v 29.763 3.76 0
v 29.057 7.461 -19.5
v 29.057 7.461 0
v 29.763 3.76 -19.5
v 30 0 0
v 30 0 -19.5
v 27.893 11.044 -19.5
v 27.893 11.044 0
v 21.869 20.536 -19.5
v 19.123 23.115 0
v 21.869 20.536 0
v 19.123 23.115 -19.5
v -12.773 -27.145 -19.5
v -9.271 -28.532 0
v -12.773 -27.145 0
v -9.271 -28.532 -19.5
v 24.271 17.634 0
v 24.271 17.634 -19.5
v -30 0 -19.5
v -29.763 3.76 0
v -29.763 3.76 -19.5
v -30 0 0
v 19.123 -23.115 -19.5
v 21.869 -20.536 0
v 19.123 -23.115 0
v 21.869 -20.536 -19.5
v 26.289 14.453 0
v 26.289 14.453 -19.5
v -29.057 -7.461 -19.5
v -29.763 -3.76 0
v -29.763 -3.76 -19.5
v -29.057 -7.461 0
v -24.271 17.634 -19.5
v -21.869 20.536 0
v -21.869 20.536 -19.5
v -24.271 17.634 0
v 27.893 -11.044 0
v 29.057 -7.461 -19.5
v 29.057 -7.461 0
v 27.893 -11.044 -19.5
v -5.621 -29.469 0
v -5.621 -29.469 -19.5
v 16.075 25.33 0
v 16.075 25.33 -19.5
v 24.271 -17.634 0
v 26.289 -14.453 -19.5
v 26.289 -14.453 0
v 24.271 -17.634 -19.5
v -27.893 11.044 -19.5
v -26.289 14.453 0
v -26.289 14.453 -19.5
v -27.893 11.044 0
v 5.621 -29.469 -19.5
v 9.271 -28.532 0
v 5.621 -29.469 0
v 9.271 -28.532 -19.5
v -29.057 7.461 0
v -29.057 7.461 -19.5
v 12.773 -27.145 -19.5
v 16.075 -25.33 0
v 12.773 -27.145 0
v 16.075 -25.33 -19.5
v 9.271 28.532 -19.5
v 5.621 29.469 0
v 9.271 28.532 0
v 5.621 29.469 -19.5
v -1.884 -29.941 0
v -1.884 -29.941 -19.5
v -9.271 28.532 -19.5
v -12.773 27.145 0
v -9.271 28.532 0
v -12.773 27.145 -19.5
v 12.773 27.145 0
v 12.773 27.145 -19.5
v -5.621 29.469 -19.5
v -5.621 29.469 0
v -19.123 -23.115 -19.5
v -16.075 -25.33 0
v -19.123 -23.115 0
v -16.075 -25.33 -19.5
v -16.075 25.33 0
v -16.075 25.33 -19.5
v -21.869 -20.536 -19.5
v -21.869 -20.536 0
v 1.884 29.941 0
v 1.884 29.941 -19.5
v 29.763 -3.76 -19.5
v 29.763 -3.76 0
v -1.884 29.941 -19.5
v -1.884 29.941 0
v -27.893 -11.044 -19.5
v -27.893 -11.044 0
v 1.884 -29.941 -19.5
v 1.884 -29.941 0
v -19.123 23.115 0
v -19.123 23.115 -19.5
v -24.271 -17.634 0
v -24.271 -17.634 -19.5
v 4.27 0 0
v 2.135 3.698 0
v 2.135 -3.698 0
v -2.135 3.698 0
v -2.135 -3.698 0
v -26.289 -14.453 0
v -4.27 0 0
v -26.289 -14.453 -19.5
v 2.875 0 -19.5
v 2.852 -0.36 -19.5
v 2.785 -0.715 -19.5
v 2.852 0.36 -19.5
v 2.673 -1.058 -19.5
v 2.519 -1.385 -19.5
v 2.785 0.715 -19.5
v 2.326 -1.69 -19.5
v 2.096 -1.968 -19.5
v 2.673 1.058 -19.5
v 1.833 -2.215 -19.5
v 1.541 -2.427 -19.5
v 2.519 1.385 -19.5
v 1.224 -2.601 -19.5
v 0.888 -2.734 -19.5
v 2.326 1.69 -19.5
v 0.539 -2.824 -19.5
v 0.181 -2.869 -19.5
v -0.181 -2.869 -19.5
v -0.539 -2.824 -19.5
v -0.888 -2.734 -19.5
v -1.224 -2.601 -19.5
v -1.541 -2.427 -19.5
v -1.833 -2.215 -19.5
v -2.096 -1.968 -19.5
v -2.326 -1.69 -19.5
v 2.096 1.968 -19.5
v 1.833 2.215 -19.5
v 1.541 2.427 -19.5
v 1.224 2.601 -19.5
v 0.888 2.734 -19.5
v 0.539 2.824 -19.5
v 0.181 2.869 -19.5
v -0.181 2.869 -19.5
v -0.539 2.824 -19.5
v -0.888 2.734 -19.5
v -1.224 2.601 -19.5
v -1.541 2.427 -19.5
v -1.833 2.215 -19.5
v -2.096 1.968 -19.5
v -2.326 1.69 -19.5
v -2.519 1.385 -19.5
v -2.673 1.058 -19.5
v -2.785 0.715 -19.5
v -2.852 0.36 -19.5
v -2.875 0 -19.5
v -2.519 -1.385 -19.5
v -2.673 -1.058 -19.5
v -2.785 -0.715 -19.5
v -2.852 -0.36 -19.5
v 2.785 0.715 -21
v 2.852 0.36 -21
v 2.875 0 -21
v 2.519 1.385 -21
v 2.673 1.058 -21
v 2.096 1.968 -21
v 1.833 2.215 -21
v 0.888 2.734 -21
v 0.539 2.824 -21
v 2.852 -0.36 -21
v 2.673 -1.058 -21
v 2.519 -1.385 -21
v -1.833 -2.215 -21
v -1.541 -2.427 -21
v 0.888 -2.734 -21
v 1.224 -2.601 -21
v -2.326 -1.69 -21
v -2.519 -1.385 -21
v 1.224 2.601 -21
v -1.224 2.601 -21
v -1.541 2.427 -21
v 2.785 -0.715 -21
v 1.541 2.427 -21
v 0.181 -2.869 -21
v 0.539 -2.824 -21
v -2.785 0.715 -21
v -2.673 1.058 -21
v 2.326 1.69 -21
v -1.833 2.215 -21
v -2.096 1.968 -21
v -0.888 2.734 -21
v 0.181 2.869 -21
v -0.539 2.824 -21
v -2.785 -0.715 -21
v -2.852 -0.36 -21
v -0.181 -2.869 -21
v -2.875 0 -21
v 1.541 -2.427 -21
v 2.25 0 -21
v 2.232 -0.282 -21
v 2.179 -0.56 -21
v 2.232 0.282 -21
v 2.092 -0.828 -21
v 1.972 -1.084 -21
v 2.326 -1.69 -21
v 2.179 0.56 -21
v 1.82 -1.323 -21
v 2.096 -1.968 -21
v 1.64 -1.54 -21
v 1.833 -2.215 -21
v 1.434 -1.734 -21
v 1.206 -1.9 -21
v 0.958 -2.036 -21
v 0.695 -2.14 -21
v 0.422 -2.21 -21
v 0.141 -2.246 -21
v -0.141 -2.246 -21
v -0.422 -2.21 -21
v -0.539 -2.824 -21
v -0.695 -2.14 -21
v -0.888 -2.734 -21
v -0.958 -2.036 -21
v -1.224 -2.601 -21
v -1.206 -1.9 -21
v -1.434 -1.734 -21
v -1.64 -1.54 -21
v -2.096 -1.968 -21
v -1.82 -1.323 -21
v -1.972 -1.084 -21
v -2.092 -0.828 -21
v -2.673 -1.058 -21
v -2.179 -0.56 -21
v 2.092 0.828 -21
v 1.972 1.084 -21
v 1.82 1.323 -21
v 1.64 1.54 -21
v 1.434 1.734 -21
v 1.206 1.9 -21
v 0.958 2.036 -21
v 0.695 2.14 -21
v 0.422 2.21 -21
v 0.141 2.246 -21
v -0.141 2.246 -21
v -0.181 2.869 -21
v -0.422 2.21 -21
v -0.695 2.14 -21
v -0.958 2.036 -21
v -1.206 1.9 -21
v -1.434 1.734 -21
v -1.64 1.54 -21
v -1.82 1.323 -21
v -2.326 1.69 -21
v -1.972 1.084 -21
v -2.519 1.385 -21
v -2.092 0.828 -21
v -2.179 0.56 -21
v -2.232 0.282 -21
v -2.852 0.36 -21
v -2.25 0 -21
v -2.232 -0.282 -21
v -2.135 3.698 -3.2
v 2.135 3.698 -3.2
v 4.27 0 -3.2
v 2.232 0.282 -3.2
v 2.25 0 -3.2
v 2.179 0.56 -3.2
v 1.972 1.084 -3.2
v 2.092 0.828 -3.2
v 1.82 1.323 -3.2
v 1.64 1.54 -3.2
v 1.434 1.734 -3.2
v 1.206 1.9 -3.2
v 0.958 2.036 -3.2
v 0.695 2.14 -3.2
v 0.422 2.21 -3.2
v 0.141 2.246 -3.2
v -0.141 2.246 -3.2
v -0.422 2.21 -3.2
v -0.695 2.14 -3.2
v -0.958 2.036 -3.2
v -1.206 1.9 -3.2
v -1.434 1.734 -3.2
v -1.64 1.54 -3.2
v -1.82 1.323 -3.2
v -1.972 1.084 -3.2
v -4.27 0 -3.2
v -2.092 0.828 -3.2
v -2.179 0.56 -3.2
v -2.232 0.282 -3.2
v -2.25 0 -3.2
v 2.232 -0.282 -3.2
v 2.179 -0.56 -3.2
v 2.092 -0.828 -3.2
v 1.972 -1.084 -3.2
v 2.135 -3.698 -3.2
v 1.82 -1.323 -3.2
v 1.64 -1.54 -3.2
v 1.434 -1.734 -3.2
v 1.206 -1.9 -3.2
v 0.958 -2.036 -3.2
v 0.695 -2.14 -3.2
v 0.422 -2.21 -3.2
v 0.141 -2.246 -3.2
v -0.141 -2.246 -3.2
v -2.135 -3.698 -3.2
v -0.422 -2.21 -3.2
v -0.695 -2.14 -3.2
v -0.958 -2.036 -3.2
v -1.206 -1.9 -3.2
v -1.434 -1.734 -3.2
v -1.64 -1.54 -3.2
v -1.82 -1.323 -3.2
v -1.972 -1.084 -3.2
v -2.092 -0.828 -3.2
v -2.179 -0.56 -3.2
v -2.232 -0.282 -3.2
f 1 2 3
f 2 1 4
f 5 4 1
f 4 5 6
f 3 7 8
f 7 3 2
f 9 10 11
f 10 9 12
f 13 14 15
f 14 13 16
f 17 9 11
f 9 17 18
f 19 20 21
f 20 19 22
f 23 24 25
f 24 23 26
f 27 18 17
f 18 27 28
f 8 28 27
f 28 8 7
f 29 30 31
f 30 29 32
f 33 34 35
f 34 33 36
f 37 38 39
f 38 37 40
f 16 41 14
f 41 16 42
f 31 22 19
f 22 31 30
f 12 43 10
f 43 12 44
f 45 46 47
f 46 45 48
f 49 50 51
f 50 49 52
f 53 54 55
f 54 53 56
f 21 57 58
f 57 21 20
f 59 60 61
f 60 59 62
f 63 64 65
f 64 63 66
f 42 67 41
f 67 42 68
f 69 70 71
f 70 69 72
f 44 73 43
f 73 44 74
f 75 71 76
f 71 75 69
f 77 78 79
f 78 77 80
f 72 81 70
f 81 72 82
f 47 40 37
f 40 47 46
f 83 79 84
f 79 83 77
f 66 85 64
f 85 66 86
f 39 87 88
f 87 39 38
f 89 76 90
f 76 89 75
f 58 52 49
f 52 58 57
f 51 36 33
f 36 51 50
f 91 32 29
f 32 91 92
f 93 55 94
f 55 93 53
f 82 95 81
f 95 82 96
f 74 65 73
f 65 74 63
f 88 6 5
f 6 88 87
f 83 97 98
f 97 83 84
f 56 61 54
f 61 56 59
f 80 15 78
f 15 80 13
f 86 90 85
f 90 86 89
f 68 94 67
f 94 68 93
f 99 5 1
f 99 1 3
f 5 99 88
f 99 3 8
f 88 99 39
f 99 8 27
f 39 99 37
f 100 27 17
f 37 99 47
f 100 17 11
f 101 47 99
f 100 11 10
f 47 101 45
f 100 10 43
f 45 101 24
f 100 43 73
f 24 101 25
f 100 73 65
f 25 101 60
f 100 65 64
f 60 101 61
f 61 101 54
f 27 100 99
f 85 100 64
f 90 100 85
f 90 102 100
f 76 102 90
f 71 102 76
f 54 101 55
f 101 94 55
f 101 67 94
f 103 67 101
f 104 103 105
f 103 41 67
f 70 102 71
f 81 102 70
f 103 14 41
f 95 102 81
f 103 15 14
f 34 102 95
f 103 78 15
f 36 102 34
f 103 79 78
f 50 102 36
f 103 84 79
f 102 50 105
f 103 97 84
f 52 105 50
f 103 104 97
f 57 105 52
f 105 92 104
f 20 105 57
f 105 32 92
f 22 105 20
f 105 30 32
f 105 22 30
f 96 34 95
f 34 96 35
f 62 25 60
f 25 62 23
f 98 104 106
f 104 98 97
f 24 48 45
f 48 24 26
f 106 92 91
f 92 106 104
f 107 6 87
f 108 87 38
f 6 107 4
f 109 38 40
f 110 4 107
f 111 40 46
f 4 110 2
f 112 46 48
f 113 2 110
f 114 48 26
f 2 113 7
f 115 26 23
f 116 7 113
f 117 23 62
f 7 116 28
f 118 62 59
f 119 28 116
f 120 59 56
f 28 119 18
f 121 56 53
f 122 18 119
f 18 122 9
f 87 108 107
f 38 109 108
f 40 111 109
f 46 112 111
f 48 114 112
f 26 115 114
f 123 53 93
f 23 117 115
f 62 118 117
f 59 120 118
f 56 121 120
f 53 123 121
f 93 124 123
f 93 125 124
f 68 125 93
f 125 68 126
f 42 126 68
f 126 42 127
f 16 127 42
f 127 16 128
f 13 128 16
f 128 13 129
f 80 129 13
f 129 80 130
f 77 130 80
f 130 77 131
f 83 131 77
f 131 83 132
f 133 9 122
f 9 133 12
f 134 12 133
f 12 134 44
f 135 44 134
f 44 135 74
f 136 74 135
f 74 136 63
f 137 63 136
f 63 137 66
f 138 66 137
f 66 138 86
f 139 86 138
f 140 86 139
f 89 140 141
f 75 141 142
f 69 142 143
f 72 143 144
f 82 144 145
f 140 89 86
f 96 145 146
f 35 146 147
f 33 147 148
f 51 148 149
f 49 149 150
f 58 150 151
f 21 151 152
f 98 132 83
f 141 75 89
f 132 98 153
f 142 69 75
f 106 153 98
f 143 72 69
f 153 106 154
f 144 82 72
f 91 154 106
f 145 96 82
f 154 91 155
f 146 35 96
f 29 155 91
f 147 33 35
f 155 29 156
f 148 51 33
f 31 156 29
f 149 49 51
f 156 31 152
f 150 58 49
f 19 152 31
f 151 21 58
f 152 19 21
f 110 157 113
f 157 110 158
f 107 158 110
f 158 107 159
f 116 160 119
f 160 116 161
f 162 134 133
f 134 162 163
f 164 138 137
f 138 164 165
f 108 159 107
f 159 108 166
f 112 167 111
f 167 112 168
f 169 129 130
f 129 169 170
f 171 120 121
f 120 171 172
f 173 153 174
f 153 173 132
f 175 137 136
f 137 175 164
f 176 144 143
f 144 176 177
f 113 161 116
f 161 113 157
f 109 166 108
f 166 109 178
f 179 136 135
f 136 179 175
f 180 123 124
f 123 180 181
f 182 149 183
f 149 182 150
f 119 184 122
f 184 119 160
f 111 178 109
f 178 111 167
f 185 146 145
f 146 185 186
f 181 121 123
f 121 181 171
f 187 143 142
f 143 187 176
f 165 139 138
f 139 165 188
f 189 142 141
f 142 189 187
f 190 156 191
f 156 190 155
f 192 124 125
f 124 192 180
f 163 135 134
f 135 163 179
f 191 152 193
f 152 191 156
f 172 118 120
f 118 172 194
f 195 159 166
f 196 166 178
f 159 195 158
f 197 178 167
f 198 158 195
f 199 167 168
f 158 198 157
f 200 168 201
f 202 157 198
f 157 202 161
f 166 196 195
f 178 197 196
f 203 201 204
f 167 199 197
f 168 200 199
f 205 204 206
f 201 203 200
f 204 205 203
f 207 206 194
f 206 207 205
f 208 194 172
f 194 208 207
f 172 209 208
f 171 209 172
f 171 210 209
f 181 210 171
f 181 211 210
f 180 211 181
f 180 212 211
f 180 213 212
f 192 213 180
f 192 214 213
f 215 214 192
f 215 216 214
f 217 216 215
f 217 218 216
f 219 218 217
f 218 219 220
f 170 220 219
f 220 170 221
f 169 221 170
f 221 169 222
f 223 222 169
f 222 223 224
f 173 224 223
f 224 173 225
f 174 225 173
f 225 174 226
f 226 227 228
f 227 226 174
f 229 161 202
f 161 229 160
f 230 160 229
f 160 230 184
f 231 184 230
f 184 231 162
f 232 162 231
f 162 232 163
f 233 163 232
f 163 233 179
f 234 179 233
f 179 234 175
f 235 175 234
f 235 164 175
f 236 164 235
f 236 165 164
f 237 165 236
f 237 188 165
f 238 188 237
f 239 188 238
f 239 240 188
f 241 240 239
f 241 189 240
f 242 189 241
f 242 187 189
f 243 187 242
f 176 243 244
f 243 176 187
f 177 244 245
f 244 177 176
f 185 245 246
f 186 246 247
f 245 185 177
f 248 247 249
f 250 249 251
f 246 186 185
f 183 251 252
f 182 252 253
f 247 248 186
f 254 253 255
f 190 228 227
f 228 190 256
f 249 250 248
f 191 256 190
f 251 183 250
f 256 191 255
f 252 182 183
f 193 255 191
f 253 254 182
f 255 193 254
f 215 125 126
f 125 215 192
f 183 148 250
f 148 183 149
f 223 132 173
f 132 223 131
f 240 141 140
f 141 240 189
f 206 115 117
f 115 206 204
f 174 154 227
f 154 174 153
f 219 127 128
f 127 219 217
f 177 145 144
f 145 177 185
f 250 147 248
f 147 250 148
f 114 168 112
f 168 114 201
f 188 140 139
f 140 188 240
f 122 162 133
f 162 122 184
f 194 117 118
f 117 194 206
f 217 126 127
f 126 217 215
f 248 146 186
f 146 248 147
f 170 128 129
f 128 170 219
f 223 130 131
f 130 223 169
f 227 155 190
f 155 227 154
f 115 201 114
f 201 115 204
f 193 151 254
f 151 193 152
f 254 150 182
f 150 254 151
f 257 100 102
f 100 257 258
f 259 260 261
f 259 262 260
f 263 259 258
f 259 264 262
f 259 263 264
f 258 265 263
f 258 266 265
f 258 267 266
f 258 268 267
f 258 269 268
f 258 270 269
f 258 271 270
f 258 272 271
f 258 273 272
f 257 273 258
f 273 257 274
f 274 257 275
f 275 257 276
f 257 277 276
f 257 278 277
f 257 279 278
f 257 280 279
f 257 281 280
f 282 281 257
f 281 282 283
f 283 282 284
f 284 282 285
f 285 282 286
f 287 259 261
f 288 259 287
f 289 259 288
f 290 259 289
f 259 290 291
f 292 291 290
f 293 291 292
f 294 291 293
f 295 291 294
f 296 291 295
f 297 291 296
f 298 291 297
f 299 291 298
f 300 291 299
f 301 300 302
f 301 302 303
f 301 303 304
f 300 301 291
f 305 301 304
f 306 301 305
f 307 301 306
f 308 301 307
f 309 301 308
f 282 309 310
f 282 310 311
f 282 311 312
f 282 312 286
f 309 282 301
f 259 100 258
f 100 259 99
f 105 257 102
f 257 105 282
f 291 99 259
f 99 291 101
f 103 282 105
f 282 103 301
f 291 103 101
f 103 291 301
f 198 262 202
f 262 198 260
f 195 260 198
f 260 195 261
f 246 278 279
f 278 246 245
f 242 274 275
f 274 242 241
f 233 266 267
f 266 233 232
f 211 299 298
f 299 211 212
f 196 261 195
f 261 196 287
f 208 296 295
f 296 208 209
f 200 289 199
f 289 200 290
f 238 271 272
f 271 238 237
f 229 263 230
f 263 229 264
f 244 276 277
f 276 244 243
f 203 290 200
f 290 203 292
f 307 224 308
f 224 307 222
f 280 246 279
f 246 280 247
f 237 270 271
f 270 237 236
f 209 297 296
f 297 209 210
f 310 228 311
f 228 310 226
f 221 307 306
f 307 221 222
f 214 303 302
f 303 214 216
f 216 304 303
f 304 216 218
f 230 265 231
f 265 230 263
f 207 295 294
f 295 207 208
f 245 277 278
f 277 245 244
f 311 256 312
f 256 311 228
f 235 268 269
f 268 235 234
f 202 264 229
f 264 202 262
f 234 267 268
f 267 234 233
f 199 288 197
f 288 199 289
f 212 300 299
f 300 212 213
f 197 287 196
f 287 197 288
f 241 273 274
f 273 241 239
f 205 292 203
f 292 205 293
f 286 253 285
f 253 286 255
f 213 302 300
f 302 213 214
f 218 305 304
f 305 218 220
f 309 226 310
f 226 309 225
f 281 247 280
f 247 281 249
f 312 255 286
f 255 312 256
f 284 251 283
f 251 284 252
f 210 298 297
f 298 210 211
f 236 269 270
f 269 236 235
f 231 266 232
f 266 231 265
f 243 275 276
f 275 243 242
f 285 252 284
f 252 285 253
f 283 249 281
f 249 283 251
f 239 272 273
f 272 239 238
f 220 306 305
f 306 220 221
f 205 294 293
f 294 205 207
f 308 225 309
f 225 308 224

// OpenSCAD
$fn = 50;


difference() {
	union() {
		translate(v = [0, 0, -19.5000000000]) {
			cylinder(h = 19.5000000000, r = 30.0000000000);
		}
		#translate(v = [0, 0, -21.0000000000]) {
			cylinder(h = 21, r = 2.8750000000);
		}
	}
	union() {
		translate(v = [0, 0, 0]) {
			rotate(a = [0, 0, 0]) {
				difference() {
					union() {
						translate(v = [0, 0, -3.2000000000]) {
							linear_extrude(height = 3.2000000000) {
								polygon(points = [[4.2698000000, 0.0000000000], [2.1349000000, 3.6977552691], [-2.1349000000, 3.6977552691], [-4.2698000000, 0.0000000000], [-2.1349000000, -3.6977552691], [2.1349000000, -3.6977552691]]);
							}
						}
					}
					union();
				}
			}
		}
		#translate(v = [0, 0, -100.0000000000]) {
			cylinder(h = 200, r = 2.2500000000);
		}
	}
}
